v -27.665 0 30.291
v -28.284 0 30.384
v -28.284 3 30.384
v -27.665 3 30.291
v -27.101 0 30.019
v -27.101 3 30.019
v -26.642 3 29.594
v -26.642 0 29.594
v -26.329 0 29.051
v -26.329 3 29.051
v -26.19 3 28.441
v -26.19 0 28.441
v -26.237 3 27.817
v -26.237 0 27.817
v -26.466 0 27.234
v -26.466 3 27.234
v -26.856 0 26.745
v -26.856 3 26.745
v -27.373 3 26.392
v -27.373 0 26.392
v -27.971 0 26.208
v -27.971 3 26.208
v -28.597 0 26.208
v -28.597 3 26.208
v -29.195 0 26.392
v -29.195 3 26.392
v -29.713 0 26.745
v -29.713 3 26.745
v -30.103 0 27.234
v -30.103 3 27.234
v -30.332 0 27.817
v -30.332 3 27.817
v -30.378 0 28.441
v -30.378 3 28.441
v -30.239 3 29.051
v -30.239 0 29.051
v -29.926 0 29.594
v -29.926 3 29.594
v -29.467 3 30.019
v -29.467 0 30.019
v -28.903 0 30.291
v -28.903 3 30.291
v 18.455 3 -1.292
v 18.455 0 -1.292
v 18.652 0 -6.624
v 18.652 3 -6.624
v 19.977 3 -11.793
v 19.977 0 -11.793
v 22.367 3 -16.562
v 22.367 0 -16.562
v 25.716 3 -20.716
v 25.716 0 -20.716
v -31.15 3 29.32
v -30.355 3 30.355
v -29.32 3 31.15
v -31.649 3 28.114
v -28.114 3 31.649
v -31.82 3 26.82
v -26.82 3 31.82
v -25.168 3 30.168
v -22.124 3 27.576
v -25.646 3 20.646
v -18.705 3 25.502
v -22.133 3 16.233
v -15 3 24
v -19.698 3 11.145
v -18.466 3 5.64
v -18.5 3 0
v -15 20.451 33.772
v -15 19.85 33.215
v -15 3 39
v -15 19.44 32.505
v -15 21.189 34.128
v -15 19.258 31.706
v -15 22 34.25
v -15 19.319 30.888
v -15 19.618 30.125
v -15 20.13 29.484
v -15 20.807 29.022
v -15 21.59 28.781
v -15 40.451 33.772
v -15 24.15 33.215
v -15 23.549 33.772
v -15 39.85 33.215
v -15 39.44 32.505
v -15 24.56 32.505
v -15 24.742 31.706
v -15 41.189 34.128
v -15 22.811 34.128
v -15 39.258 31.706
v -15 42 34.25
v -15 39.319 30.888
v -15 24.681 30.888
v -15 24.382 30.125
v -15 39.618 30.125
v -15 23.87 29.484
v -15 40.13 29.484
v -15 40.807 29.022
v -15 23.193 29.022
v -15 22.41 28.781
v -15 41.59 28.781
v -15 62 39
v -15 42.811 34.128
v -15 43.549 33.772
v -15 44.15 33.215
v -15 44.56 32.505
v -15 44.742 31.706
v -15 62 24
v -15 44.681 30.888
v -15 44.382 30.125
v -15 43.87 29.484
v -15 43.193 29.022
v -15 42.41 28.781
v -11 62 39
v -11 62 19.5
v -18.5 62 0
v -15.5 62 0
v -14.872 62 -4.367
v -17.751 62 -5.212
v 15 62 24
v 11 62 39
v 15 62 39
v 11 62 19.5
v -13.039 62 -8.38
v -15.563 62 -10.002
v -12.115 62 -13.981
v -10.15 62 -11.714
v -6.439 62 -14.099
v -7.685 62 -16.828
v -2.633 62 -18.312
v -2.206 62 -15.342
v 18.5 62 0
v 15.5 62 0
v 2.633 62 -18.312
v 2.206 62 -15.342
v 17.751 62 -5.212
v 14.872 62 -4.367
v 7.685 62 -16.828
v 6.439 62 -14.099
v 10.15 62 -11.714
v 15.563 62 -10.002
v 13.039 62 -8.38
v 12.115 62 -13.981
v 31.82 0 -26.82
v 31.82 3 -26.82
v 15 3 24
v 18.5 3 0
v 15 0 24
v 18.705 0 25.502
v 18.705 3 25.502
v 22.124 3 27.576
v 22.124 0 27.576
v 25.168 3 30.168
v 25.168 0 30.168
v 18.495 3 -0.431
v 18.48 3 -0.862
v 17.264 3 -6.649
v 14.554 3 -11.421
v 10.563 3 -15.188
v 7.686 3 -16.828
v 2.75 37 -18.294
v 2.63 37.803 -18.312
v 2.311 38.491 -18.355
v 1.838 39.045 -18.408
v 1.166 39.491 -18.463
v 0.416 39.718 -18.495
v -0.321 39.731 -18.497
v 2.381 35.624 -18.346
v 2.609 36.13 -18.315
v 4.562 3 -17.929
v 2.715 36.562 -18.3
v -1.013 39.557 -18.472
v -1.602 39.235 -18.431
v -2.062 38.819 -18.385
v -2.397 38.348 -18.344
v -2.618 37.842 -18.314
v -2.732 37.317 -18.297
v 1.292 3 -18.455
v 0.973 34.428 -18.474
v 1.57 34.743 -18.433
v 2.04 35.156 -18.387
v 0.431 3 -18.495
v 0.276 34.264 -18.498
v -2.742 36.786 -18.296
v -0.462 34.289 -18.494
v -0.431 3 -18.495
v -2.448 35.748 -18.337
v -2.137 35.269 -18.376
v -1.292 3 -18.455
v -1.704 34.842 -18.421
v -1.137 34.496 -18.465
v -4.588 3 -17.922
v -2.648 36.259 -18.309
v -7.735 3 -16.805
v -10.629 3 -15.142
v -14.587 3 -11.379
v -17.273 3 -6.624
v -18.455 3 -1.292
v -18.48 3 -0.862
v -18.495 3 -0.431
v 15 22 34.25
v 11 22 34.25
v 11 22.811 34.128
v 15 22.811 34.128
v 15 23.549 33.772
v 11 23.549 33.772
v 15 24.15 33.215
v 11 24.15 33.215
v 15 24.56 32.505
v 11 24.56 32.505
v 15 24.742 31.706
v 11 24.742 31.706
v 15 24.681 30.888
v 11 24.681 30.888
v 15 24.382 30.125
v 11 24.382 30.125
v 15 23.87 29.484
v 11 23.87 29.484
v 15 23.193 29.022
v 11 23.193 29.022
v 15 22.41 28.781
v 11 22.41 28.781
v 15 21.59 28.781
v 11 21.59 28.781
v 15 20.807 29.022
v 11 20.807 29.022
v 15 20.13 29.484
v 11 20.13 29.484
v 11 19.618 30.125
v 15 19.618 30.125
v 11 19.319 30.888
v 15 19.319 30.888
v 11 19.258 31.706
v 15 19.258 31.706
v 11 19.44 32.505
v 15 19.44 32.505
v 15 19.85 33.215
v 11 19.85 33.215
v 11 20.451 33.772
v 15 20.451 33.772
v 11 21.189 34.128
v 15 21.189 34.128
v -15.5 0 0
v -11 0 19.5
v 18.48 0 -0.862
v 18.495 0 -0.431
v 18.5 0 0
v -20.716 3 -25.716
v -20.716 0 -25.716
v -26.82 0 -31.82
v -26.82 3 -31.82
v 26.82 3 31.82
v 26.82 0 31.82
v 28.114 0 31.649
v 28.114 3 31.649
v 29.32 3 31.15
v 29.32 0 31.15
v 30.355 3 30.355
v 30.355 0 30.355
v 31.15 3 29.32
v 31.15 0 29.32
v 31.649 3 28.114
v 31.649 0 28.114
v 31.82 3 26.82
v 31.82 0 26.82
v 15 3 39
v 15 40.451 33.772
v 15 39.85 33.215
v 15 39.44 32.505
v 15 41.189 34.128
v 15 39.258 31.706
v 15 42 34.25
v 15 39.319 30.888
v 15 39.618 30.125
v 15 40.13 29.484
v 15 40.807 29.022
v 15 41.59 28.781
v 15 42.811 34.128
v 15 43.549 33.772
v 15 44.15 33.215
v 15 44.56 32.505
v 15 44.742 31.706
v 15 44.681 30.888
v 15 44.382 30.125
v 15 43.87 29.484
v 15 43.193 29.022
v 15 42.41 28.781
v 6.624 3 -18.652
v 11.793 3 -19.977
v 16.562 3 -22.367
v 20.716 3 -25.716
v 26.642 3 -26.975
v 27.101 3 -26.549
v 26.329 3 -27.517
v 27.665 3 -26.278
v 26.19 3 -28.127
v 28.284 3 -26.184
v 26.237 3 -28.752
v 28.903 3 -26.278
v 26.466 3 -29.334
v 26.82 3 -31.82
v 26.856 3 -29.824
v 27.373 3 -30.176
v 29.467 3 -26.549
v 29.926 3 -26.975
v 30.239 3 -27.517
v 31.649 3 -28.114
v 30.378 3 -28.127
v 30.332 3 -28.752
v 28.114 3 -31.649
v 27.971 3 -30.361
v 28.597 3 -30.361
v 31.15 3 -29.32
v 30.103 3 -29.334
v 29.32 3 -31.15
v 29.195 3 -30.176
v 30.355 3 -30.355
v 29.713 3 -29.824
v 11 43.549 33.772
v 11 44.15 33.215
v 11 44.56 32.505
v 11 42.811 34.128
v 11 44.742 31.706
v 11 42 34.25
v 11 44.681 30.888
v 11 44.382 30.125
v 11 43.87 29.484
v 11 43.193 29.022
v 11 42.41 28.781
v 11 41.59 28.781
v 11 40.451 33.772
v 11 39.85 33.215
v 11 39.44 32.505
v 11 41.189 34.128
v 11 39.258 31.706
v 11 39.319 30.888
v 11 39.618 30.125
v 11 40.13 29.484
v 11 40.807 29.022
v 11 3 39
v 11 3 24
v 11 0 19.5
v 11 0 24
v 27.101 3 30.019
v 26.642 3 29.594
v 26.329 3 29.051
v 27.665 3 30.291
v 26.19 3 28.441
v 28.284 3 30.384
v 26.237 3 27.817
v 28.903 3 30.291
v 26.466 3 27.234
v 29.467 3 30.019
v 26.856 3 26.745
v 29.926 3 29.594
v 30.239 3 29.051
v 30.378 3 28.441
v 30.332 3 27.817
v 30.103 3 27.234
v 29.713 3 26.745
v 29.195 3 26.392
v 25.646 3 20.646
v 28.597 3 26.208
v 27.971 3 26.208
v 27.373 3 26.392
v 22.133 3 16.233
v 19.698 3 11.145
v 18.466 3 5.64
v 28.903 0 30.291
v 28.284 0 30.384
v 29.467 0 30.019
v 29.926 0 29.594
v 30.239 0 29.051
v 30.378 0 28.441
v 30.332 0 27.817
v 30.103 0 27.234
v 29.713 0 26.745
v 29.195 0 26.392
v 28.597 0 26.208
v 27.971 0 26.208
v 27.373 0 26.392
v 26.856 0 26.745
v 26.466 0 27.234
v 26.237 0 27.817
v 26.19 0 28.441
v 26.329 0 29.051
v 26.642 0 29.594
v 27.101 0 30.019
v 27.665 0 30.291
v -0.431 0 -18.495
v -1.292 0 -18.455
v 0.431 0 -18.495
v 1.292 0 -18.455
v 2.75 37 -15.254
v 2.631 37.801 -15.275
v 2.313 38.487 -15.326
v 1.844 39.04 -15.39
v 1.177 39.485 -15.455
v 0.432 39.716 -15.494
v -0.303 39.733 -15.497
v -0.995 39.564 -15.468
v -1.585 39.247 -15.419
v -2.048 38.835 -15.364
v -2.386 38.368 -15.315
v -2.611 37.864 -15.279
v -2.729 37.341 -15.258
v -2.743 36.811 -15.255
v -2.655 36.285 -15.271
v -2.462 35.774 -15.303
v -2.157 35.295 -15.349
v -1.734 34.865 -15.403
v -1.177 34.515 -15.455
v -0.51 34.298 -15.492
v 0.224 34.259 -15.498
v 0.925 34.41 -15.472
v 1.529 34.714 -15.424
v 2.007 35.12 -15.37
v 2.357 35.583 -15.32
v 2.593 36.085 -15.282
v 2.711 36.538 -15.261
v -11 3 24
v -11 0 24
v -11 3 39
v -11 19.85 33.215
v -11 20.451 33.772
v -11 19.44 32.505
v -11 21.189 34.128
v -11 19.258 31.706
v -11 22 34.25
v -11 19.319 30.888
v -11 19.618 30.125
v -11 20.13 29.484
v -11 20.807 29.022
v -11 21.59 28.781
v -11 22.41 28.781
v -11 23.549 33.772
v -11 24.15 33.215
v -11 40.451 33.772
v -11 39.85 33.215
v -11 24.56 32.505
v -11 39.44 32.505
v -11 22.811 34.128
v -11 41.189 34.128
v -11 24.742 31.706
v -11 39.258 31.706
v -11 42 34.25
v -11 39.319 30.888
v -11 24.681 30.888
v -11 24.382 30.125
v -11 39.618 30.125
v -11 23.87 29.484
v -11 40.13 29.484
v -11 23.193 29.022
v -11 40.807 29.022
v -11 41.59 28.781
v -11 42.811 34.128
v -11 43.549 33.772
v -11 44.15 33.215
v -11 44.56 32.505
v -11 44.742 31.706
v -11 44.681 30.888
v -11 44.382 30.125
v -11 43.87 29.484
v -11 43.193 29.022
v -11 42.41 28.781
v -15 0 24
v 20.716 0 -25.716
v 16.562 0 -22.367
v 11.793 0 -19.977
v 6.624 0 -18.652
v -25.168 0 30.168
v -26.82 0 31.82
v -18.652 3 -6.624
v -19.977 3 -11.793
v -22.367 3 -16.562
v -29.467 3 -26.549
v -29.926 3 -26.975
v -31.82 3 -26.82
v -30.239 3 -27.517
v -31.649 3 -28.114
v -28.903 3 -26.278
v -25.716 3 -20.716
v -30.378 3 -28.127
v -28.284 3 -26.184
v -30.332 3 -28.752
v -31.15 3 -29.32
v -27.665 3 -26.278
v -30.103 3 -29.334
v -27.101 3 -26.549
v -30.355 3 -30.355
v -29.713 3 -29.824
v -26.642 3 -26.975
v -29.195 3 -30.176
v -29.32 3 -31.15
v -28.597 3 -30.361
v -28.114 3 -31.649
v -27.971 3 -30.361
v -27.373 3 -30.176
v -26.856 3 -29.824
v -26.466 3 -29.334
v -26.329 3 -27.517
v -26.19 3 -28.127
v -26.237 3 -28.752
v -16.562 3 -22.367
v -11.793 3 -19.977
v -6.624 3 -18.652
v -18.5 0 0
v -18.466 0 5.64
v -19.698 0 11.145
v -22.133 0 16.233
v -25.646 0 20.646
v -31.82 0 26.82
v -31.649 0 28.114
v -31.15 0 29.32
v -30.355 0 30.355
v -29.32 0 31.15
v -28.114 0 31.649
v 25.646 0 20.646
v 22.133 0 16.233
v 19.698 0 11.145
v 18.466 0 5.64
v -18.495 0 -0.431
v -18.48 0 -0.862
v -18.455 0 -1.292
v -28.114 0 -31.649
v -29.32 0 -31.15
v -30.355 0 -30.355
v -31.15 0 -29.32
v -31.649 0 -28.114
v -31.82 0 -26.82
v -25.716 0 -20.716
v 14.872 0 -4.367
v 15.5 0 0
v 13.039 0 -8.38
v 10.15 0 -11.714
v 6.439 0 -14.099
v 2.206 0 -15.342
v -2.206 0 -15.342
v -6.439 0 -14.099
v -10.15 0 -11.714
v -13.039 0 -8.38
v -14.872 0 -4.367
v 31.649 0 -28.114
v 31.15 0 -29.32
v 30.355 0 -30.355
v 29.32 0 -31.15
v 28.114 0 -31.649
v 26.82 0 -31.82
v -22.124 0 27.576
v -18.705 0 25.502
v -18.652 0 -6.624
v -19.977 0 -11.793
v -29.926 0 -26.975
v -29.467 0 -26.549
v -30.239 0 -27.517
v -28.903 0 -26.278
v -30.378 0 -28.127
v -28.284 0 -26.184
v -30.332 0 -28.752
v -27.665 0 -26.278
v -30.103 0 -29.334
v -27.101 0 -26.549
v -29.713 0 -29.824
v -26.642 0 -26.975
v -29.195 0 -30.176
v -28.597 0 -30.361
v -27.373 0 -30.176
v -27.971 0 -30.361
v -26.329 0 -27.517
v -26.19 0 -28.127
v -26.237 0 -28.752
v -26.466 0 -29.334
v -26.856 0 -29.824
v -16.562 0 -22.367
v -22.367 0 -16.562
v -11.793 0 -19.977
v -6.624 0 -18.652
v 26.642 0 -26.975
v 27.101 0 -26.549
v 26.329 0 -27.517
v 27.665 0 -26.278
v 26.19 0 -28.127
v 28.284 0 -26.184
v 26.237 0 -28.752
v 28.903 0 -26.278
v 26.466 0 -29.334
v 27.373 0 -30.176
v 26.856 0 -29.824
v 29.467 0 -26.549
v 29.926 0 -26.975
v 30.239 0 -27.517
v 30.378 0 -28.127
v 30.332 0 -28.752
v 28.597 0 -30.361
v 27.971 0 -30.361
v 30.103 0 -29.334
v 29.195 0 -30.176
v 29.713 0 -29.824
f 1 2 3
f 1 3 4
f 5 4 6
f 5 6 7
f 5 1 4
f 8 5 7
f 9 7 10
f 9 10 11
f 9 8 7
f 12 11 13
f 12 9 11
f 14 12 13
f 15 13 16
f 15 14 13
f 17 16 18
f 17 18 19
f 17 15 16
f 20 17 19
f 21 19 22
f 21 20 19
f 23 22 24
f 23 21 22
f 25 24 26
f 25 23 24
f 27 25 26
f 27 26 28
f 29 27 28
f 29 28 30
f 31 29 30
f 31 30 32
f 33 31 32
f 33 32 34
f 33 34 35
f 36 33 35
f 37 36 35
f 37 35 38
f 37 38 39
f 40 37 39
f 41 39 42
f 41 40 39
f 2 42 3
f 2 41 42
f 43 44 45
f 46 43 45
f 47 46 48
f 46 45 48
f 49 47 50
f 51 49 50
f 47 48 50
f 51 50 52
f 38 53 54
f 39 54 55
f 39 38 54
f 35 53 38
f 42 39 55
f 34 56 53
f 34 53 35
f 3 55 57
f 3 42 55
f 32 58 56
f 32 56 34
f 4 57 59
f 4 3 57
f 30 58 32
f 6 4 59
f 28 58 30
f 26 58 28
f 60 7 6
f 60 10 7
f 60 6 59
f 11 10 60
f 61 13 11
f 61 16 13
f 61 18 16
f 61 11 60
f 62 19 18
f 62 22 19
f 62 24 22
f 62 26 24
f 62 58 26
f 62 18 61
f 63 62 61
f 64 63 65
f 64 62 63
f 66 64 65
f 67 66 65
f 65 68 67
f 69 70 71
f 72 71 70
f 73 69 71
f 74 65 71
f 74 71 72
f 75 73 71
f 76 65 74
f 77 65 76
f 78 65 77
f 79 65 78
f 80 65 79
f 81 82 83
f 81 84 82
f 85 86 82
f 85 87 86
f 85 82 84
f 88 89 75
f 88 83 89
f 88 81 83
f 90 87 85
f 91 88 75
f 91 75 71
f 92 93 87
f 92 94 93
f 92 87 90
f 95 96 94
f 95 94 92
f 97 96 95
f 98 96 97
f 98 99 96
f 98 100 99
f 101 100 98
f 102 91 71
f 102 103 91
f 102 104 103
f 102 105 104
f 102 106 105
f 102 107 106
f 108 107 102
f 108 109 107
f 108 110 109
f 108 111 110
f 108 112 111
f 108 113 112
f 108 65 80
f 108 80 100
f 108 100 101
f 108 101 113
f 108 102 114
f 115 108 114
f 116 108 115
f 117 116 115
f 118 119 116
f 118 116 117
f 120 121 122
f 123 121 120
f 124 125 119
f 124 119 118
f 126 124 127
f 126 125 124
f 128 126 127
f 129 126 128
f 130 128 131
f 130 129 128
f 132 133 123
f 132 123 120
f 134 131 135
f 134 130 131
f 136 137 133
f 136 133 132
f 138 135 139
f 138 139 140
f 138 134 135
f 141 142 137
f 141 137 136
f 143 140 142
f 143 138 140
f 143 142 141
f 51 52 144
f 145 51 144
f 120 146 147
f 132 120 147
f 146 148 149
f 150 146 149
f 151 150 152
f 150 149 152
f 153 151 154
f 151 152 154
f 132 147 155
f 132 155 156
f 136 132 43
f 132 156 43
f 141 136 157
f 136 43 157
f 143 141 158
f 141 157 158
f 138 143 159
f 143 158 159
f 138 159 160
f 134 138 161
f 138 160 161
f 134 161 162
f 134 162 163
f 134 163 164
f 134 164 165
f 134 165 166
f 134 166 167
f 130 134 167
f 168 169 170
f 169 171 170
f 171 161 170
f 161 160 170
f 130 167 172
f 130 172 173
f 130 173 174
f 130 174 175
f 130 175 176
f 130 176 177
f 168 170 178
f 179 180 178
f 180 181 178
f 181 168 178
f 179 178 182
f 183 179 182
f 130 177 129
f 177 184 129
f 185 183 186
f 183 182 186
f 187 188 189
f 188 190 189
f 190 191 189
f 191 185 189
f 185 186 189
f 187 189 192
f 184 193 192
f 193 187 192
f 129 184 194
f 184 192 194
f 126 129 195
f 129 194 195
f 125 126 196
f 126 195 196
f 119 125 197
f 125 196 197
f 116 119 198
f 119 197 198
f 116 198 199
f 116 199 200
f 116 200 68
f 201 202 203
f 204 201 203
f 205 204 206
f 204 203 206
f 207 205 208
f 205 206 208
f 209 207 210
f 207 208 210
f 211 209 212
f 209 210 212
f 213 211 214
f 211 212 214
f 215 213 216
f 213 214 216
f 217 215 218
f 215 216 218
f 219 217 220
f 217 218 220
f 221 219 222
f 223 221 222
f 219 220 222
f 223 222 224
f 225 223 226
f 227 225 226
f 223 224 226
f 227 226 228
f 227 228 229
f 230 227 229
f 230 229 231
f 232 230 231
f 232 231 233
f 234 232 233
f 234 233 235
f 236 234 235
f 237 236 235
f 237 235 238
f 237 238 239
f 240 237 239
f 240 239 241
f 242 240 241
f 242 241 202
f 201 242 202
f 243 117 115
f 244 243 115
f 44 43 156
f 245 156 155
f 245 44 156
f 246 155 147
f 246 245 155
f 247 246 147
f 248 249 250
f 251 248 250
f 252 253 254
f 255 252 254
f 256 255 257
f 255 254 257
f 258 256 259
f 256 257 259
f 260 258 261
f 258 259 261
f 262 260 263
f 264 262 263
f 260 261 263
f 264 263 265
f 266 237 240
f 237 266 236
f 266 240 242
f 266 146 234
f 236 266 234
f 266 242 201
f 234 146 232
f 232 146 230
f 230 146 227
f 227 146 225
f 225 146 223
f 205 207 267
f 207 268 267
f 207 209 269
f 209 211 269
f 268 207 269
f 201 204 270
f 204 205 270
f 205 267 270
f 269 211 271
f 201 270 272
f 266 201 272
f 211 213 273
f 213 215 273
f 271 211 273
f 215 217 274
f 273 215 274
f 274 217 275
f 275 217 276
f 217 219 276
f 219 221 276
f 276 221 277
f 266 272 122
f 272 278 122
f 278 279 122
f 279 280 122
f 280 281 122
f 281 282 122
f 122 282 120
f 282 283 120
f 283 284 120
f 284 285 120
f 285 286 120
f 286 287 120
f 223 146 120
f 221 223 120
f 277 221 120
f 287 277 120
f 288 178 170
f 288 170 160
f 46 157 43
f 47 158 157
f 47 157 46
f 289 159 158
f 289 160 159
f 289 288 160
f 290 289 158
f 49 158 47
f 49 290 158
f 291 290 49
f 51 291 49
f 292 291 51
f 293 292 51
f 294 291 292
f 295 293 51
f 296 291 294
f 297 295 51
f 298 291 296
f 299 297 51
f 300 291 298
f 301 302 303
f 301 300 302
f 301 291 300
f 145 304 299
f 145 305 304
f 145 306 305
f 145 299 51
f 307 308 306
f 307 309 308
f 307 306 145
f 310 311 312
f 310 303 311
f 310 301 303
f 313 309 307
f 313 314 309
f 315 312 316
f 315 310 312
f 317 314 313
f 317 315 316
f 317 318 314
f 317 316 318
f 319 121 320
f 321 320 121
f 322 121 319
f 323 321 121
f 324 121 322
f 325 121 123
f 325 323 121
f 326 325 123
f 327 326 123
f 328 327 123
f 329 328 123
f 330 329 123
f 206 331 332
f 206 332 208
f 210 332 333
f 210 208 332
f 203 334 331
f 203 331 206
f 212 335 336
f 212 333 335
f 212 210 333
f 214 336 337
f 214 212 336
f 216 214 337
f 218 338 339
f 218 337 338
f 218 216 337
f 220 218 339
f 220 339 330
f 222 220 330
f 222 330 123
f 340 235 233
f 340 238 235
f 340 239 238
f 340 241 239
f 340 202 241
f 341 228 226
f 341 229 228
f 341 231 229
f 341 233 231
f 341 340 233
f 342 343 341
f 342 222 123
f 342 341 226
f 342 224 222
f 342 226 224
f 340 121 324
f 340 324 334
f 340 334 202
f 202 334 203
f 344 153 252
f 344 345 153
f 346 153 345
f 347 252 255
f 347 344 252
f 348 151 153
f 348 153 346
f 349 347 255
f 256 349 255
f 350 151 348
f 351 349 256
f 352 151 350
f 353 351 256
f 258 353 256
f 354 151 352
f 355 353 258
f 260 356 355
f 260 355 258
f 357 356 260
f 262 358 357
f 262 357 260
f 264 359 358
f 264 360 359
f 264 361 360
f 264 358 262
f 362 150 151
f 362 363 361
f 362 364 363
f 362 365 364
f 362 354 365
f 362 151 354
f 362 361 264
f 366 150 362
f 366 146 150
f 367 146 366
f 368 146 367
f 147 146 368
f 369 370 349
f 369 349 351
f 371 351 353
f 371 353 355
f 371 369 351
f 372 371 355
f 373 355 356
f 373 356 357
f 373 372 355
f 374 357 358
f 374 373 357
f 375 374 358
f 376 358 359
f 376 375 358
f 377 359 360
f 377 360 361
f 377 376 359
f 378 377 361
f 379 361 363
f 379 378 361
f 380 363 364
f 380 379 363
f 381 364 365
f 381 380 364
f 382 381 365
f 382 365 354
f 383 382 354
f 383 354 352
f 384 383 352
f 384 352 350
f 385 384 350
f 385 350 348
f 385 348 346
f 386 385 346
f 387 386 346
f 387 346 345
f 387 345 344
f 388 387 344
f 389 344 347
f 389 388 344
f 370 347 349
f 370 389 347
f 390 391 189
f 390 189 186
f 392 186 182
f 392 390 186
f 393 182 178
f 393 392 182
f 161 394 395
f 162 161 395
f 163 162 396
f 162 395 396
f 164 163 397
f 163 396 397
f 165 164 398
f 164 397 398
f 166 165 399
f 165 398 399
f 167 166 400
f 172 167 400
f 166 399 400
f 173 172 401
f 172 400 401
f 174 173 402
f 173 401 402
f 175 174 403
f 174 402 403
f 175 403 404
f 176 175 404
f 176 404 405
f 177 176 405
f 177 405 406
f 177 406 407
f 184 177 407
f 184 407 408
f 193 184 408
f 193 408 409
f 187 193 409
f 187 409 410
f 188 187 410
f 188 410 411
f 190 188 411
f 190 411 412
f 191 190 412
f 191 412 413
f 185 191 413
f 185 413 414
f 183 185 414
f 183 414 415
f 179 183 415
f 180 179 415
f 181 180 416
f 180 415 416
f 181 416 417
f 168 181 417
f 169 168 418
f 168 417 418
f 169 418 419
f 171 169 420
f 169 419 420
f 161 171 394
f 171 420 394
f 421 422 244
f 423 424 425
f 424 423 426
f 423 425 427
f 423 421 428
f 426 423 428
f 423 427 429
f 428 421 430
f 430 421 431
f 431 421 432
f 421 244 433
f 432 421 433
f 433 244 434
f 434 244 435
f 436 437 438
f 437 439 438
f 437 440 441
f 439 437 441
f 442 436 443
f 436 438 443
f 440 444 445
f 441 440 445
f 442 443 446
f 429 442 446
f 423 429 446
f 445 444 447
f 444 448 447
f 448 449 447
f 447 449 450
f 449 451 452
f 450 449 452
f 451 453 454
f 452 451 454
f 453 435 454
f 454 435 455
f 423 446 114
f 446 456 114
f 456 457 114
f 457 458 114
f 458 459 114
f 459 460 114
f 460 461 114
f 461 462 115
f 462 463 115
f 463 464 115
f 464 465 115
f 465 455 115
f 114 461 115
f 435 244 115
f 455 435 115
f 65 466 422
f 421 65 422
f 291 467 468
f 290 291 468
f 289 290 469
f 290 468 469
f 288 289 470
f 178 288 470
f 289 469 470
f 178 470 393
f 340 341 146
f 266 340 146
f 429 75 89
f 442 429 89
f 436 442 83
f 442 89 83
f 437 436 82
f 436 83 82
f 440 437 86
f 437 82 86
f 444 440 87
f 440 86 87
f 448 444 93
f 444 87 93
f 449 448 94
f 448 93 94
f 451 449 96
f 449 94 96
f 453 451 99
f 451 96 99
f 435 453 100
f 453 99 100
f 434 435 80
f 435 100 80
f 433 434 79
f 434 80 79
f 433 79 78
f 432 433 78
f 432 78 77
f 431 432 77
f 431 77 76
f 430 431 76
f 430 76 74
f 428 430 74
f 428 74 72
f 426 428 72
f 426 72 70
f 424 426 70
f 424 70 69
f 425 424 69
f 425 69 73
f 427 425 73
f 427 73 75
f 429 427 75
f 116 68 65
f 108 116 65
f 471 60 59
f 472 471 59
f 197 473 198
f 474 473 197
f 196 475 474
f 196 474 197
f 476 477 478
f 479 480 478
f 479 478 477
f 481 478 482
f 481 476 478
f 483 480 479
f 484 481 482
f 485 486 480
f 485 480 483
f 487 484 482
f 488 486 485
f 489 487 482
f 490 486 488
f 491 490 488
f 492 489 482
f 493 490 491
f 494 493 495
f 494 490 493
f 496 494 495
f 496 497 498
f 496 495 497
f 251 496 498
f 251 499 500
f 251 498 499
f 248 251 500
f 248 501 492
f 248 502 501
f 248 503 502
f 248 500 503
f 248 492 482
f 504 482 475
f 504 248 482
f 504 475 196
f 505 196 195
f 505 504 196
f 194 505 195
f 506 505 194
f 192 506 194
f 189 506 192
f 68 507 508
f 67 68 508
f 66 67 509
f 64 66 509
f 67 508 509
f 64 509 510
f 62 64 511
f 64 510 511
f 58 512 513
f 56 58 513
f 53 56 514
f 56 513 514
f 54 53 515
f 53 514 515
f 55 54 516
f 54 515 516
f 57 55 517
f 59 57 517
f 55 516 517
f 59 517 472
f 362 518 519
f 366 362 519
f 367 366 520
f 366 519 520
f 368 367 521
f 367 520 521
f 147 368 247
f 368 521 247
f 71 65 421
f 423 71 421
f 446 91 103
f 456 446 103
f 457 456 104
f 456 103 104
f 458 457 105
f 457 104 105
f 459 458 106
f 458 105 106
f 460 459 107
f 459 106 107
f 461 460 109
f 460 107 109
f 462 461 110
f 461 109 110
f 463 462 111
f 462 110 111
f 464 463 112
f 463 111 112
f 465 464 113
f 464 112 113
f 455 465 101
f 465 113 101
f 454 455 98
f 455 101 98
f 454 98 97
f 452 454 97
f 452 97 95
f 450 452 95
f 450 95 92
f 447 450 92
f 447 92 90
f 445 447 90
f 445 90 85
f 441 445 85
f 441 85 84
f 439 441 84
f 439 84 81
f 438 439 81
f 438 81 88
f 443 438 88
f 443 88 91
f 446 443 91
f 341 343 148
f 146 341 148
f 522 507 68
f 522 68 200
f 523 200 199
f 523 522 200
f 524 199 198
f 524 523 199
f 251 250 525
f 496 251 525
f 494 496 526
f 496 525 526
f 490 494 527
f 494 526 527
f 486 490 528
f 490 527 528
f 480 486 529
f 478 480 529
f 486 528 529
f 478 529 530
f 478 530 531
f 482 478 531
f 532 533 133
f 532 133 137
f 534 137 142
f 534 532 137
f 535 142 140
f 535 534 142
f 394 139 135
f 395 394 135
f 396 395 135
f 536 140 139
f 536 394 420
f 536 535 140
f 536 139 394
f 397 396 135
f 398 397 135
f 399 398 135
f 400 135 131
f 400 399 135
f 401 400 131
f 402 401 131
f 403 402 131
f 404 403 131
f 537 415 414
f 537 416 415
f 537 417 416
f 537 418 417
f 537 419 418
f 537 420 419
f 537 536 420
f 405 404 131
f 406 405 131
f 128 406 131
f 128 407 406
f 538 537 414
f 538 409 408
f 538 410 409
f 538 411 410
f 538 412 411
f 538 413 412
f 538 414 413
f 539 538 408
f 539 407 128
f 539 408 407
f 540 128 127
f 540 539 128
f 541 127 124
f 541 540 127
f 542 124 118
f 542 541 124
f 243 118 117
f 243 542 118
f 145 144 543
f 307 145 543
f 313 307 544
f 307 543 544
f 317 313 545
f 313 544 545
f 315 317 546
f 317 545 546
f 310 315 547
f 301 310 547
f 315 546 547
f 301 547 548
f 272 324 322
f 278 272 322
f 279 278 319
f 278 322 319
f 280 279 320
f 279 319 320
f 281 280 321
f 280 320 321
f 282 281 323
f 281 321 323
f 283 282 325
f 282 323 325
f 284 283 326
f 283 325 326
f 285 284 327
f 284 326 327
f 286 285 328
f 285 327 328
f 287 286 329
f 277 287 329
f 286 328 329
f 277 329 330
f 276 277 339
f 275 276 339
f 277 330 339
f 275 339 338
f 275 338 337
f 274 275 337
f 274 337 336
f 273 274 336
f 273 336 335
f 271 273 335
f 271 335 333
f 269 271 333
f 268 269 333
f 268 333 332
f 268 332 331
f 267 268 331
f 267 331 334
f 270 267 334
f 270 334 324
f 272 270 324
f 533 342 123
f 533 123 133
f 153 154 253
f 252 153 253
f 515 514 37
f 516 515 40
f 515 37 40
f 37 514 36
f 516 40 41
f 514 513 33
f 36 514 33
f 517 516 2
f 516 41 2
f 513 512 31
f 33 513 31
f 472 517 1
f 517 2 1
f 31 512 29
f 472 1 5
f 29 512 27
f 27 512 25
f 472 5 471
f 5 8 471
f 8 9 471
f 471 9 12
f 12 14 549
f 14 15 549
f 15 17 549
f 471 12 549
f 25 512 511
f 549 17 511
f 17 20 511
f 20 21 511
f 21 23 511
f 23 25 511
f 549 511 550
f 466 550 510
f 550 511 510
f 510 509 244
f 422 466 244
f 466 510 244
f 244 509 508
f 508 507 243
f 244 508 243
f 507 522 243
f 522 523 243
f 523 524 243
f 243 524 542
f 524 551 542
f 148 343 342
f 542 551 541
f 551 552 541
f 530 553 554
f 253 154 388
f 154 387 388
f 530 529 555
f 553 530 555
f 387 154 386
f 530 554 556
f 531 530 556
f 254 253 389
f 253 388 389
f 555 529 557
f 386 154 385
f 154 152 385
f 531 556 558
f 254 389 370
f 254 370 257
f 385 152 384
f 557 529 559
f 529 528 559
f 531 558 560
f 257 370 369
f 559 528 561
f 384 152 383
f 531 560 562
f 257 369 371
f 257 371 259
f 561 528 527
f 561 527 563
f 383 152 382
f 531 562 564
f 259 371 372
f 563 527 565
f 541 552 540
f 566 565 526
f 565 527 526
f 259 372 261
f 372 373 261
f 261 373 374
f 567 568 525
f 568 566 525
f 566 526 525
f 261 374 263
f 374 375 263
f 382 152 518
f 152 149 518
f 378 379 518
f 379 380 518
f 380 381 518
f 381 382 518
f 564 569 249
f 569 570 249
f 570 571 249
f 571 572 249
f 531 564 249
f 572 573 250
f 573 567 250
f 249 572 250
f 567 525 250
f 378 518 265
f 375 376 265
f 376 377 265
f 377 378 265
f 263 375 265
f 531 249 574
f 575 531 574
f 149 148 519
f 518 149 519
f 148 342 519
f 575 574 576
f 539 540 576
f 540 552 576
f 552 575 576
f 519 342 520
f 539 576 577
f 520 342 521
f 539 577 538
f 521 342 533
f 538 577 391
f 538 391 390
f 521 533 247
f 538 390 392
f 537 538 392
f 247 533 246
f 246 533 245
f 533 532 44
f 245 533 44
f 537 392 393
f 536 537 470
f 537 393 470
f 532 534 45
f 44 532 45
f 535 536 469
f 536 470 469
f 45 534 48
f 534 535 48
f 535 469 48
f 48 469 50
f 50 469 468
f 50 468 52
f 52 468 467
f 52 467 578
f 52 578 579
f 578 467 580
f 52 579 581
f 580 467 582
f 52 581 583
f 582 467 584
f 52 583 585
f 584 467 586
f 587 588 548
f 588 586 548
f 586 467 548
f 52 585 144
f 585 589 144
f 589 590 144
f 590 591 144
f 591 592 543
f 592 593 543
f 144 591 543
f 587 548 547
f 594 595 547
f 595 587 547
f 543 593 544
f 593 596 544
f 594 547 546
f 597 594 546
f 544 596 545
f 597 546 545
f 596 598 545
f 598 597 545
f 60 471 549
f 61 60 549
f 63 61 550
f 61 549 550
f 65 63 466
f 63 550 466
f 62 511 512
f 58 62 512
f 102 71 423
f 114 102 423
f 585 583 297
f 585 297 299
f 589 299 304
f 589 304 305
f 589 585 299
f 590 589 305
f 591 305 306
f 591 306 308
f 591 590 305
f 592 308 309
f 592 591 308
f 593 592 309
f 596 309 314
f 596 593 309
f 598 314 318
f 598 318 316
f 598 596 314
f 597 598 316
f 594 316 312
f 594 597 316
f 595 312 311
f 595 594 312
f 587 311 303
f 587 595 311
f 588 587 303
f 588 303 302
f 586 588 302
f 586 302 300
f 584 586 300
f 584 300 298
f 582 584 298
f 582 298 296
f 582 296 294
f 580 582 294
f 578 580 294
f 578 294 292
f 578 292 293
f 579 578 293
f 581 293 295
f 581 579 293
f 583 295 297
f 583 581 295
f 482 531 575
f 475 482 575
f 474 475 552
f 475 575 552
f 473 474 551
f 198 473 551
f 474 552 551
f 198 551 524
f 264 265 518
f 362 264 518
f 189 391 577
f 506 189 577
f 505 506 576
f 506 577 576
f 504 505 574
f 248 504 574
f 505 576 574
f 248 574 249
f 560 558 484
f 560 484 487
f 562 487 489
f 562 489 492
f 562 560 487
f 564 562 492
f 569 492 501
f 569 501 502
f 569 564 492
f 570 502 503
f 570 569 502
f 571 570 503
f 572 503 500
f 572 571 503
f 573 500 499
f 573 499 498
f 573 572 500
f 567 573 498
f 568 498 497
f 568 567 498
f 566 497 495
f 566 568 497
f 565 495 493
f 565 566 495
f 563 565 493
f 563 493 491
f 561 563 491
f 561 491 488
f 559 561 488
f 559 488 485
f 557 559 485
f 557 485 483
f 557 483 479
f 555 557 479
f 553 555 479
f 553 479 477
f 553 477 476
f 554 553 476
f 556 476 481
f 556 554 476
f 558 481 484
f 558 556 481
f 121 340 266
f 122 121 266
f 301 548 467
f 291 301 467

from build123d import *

# Parameters (mm, degrees)
SKETCH_1_R          = 2.1
EXTRUDE_1_DEPTH     = 3
EXTRUDE_2_DEPTH     = 59
CUT_EXTRUDE_START   = -59
CUT_EXTRUDE_1_DEPTH = 59
CUT_EXTRUDE_2_DEPTH = 59
FILLET_3_DEPTH      = 3
SKETCH_7_W          = 4
SKETCH_7_H          = 59
EXTRUDE_3_DEPTH     = 15
SKETCH_8_R          = 2.75
CUT_EXTRUDE_3_DEPTH = 136
SKETCH_9_R          = 2.75
CUT_EXTRUDE_4_DEPTH = 136


with BuildPart() as part:
    # 草图1 → 凸台-拉伸1 (new body)
    with BuildSketch(Plane(origin=(0, 0, 0), x_dir=(1, 0, 0), z_dir=(0, 1, 0))):
        with BuildLine():
            ThreePointArc((-26.819805153, 31.819805153), (-30.355339059, 30.355339059), (-31.819805153, 26.819805153))
            Line((-31.819805153, 26.819805153), (-24, 19))
            Line((-24, 19), (-24, -19))
            Line((-24, -19), (-31.819805153, -26.819805153))
            ThreePointArc((-31.819805153, -26.819805153), (-30.355339059, -30.355339059), (-26.819805153, -31.819805153))
            Line((-26.819805153, -31.819805153), (-19, -24))
            Line((-19, -24), (19, -24))
            Line((19, -24), (26.819805153, -31.819805153))
            ThreePointArc((26.819805153, -31.819805153), (30.355339059, -30.355339059), (31.819805153, -26.819805153))
            Line((31.819805153, -26.819805153), (24, -19))
            Line((24, -19), (24, 19))
            Line((24, 19), (31.819805153, 26.819805153))
            ThreePointArc((31.819805153, 26.819805153), (30.355339059, 30.355339059), (26.819805153, 31.819805153))
            Line((26.819805153, 31.819805153), (19, 24))
            Line((19, 24), (-19, 24))
            Line((-19, 24), (-26.819805153, 31.819805153))
        make_face()
        with Locations(Location((-28.284271247, 28.284271247, 0), (0, 0, 270))):
            Circle(SKETCH_1_R, mode=Mode.SUBTRACT)
        with Locations(Location((-28.284271247, -28.284271247, 0), (0, 0, 270))):
            Circle(SKETCH_1_R, mode=Mode.SUBTRACT)
        with Locations(Location((28.284271247, 28.284271247, 0), (0, 0, 270))):
            Circle(SKETCH_1_R, mode=Mode.SUBTRACT)
        with Locations(Location((28.284271247, -28.284271247, 0), (0, 0, 270))):
            Circle(SKETCH_1_R, mode=Mode.SUBTRACT)
    extrude(amount=EXTRUDE_1_DEPTH)

    # 草图2 → 凸台-拉伸2 (add)
    with BuildSketch(Plane(origin=(0, 3, 0), x_dir=(1, 0, 0), z_dir=(0, 1, 0))):
        with BuildLine():
            Line((-11, -24), (-11, -19.5))
            Line((-11, -19.5), (-15.5, 0))
            ThreePointArc((-15.5, 0), (0, 15.5), (15.5, 0))
            Line((15.5, 0), (11, -19.5))
            Line((11, -19.5), (11, -24))
            Line((11, -24), (15, -24))
            Line((15, -24), (18.5, 0))
            ThreePointArc((18.5, 0), (0, 18.5), (-18.5, 0))
            Line((-18.5, 0), (-15, -24))
            Line((-15, -24), (-11, -24))
        make_face()
    extrude(amount=EXTRUDE_2_DEPTH)

    # 草图5 → 切除-拉伸1 (cut)
    with BuildSketch(Plane(origin=(0, 3, 0), x_dir=(1, 0, 0), z_dir=(0, 1, 0)).offset(CUT_EXTRUDE_START)):
        with BuildLine():
            Line((-15.5, 0), (-11, -19.5))
            Line((-11, -19.5), (-11, -24))
            Line((-11, -24), (11, -24))
            Line((11, -24), (11, -19.5))
            Line((11, -19.5), (15.5, 0))
            ThreePointArc((15.5, 0), (0, 15.5), (-15.5, 0))
        make_face()
    extrude(amount=CUT_EXTRUDE_1_DEPTH, mode=Mode.SUBTRACT)

    # 草图6 → 切除-拉伸2 (cut)
    with BuildSketch(Plane(origin=(0, 3, 0), x_dir=(1, 0, 0), z_dir=(0, 1, 0)).offset(CUT_EXTRUDE_START)):
        with BuildLine():
            Line((-15.340366038, 10.340366038), (-24, 19))
            Line((-24, 19), (-24, -19))
            Line((-24, -19), (-16.781818182, -11.781818182))
            Line((-16.781818182, -11.781818182), (-18.5, 0))
            ThreePointArc((-18.5, 0), (-17.692466924, 5.406164458), (-15.340366038, 10.340366038))
        make_face()
        with BuildLine():
            Line((-19, 24), (-10.629360281, 15.141555403))
            ThreePointArc((-10.629360281, 15.141555403), (-0.040504877, 18.499955658), (10.562955089, 15.187955089))
            Line((10.562955089, 15.187955089), (19, 24))
            Line((19, 24), (-19, 24))
        make_face()
        Polygon((-15, -24), (-15.509090909, -20.509090909), (-19, -24), align=None)
        with BuildLine():
            Line((24, 19), (15.141555403, 10.629360281))
            ThreePointArc((15.141555403, 10.629360281), (17.640419141, 5.573653427), (18.5, 0))
            Line((18.5, 0), (16.702005947, -12.329102079))
            Line((16.702005947, -12.329102079), (24, -19))
            Line((24, -19), (24, 19))
        make_face()
        Polygon((19, -24), (15.486287413, -20.665457737), (15, -24), align=None)
    extrude(amount=CUT_EXTRUDE_2_DEPTH, mode=Mode.SUBTRACT)

    # 圆角3: read off the stored shape, not the designer's step
    # 圆角3 outline → 圆角3 (add)
    with BuildSketch(Plane(origin=(0, 0, 0), x_dir=(1, 0, 0), z_dir=(0, 1, 0))):
        with BuildLine():
            Line((-16.781818182, -11.781818182), (-18.5, 0))
            ThreePointArc((-18.5, 0), (-19.698206739, -11.144620168), (-25.645540243, -20.645540243))
            Line((-25.645540243, -20.645540243), (-16.781818182, -11.781818182))
        make_face()
        with BuildLine():
            Line((19, -24), (15.486287413, -20.665457737))
            Line((15.486287413, -20.665457737), (15, -24))
            ThreePointArc((15, -24), (20.455899997, -26.47045686), (25.167660505, -30.167660505))
            Line((25.167660505, -30.167660505), (19, -24))
        make_face()
        with BuildLine():
            ThreePointArc((25.645540243, -20.645540243), (19.698206739, -11.144620168), (18.5, 0))
            Line((18.5, 0), (16.702005947, -12.329102079))
            Line((16.702005947, -12.329102079), (24, -19))
            Line((24, -19), (25.645540243, -20.645540243))
        make_face()
        with BuildLine():
            Line((24, 19), (15.141555403, 10.629360281))
            ThreePointArc((15.141555403, 10.629360281), (17.434869544, 6.186705422), (18.454815599, 1.292200137))
            ThreePointArc((18.454815599, 1.292200137), (19.976546369, 11.792519114), (25.716086069, 20.716086069))
            Line((25.716086069, 20.716086069), (24, 19))
        make_face()
        with BuildLine():
            ThreePointArc((20.716086069, 25.716086069), (11.792519114, 19.976546369), (1.292200137, 18.454815599))
            ThreePointArc((1.292200137, 18.454815599), (6.148517769, 17.448373255), (10.562955089, 15.187955089))
            Line((10.562955089, 15.187955089), (19, 24))
            Line((19, 24), (20.716086069, 25.716086069))
        make_face()
        with BuildLine():
            Line((-19, 24), (-10.629360281, 15.141555403))
            ThreePointArc((-10.629360281, 15.141555403), (-6.186705422, 17.434869544), (-1.292200137, 18.454815599))
            ThreePointArc((-1.292200137, 18.454815599), (-11.792519114, 19.976546369), (-20.716086069, 25.716086069))
            Line((-20.716086069, 25.716086069), (-19, 24))
        make_face()
        with BuildLine():
            ThreePointArc((-25.716086069, 20.716086069), (-19.976546369, 11.792519114), (-18.454815599, 1.292200137))
            ThreePointArc((-18.454815599, 1.292200137), (-17.492738551, 6.021137598), (-15.340366038, 10.340366038))
            Line((-15.340366038, 10.340366038), (-25.716086069, 20.716086069))
        make_face()
        with BuildLine():
            Line((-15, -24), (-15.509090909, -20.509090909))
            Line((-15.509090909, -20.509090909), (-25.167660505, -30.167660505))
            ThreePointArc((-25.167660505, -30.167660505), (-20.455899997, -26.47045686), (-15, -24))
        make_face()
    extrude(amount=FILLET_3_DEPTH)

    # 草图7 → 凸台-拉伸3 (add)
    with BuildSketch(Plane.XY.offset(24)):
        with Locations((-13, 32.5)):
            Rectangle(SKETCH_7_W, SKETCH_7_H)
        with Locations((13, 32.5)):
            Rectangle(SKETCH_7_W, SKETCH_7_H)
    extrude(amount=EXTRUDE_3_DEPTH)

    # 草图8 → 切除-拉伸3 (cut)
    with BuildSketch(Plane.XY):
        with Locations((0, 37)):
            Circle(SKETCH_8_R)
    extrude(amount=-CUT_EXTRUDE_3_DEPTH, mode=Mode.SUBTRACT)

    # 草图9 → 切除-拉伸4 (cut)
    with BuildSketch(Plane.ZY.offset(15)):
        with Locations((31.5, 42)):
            Circle(SKETCH_9_R)
        with Locations((31.5, 22)):
            Circle(SKETCH_9_R)
    extrude(amount=-CUT_EXTRUDE_4_DEPTH, mode=Mode.SUBTRACT)


solid = part.part
